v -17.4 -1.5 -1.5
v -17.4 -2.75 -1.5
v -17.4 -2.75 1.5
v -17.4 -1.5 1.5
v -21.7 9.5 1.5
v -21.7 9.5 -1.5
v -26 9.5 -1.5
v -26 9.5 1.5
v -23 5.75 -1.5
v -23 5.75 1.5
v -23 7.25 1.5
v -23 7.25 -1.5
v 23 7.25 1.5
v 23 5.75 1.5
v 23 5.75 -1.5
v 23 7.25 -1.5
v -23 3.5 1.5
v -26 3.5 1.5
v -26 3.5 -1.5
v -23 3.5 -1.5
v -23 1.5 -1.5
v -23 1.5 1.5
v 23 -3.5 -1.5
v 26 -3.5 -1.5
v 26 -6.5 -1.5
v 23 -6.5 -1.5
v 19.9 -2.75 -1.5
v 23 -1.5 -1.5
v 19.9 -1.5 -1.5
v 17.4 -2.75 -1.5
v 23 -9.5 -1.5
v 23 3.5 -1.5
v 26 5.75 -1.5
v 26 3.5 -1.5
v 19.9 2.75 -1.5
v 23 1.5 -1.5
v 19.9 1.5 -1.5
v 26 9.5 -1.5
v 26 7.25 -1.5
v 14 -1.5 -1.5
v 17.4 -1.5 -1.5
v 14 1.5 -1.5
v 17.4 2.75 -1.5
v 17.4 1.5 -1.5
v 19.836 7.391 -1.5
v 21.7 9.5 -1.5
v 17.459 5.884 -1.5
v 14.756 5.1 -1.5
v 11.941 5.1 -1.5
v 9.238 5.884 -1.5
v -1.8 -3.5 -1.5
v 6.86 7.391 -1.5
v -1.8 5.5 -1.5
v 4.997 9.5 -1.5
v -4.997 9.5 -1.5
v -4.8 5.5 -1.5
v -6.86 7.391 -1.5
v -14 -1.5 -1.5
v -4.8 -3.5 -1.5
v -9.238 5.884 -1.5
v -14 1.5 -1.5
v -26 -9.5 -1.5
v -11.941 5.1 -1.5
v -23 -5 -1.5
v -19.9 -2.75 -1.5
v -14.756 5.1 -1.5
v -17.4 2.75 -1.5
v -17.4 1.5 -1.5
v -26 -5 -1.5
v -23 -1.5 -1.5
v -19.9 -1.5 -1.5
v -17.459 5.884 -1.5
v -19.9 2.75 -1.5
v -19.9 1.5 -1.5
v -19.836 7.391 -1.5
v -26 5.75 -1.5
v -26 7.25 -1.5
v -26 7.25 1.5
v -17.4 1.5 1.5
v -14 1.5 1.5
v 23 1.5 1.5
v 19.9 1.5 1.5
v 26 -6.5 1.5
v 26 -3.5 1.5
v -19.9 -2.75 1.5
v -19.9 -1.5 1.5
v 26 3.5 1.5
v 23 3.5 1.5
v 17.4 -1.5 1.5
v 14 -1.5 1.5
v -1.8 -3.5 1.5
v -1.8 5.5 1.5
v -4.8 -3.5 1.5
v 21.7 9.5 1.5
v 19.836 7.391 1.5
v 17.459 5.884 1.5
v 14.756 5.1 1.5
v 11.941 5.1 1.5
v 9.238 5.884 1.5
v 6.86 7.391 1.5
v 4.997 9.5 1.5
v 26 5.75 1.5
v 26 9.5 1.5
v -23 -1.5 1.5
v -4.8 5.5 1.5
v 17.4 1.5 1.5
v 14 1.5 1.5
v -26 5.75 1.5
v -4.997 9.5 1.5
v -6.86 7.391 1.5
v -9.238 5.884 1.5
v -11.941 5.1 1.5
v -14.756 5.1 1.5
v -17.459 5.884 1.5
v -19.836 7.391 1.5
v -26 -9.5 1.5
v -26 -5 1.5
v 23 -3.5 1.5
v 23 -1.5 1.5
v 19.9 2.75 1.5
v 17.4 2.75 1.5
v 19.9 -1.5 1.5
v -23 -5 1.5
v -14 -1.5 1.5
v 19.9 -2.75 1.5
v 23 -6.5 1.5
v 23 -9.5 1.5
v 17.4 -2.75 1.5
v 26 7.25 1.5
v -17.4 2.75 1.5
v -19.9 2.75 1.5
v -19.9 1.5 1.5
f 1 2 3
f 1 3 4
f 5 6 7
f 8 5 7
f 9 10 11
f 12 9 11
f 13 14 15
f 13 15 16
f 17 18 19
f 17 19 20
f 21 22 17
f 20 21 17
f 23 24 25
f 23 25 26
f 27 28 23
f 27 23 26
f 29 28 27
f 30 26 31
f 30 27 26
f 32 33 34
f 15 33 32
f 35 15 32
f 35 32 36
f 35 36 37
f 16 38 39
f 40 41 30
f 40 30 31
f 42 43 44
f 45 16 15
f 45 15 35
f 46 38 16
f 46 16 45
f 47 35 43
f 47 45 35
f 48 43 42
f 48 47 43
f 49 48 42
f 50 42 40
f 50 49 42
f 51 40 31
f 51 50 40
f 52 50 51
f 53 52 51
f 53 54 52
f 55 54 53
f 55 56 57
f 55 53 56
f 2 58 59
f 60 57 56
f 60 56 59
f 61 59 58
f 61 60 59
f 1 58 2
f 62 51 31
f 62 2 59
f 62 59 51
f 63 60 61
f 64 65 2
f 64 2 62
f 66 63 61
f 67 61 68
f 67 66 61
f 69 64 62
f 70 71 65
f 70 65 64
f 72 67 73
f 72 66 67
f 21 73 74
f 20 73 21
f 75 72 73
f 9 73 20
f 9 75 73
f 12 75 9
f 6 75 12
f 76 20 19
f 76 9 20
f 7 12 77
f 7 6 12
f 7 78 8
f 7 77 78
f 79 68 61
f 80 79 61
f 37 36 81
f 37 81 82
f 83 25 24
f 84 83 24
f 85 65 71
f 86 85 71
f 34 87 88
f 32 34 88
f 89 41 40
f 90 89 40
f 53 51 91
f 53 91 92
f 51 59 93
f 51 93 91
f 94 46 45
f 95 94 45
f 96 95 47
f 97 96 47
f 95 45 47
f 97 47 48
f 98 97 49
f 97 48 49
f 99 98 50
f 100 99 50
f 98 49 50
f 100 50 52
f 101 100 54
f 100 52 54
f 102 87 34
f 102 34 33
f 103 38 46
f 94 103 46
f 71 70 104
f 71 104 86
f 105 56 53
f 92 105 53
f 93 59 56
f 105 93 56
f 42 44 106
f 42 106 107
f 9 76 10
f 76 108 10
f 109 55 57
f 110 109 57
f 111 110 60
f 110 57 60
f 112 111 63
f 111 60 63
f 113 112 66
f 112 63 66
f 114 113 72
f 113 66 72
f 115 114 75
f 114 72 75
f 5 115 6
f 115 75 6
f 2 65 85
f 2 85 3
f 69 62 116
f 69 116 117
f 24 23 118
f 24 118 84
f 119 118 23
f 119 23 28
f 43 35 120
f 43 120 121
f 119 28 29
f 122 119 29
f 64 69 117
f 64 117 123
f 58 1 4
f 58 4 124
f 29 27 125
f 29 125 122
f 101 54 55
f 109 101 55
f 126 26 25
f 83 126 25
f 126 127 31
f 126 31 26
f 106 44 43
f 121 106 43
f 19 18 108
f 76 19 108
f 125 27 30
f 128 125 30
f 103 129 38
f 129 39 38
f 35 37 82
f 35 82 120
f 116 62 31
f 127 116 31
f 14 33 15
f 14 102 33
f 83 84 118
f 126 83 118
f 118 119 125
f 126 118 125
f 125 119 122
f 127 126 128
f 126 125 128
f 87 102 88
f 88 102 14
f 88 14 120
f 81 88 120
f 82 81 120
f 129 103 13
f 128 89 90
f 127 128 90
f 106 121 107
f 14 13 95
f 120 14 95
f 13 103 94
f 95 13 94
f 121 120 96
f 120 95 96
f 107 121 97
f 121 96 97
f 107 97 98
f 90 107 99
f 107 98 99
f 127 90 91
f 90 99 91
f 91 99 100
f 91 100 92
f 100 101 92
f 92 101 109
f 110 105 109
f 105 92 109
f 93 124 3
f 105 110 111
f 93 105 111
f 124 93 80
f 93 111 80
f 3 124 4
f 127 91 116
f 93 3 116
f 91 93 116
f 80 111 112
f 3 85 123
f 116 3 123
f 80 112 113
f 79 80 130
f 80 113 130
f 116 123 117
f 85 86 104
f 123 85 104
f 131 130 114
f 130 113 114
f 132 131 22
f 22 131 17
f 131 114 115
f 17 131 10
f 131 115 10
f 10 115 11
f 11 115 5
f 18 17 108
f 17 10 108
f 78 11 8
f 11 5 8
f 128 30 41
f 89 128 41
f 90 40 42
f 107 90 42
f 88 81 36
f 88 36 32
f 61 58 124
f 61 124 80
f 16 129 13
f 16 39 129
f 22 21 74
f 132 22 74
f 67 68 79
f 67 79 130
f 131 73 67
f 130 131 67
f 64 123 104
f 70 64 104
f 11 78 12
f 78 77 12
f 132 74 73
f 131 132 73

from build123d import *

# Parameters (mm, degrees)
ESBO_O1_W                     = 46
ESBO_O1_H                     = 19
RESSALTO_EXTRUS_O1_DEPTH      = 1.5
ESBO_O21_W                    = 9
ESBO_O21_H                    = 3
ESBO_O21_W_2                  = 2.5
ESBO_O21_H_2                  = 5.5
CORTE_EXTRUS_O11_DEPTH        = 3
RESSALTO_EXTRUS_O2_DEPTH      = 1.5
RESSALTO_EXTRUS_O2_DEPTH_BACK = 1.5
ESBO_O3_W                     = 3
ESBO_O3_H                     = 4.5
ESBO_O5_W                     = 3
ESBO_O5_H                     = 2.25
RESSALTO_EXTRUS_O3_DEPTH      = 1.5
RESSALTO_EXTRUS_O4_DEPTH      = 1.5
RESSALTO_EXTRUS_O4_DEPTH_BACK = 1.5
ESBO_O6_W                     = 3
ESBO_O6_H                     = 3
CORTE_EXTRUS_O2_DEPTH         = 28.721832551
CORTE_EXTRUS_O2_DEPTH_BACK    = 28.721832551
CORTE_EXTRUS_O3_DEPTH         = 28.721832551
CORTE_EXTRUS_O3_DEPTH_BACK    = 28.721832551
ESBO_O8_W                     = 3
ESBO_O8_H                     = 9


with BuildPart() as part:
    # Esboço1 → Ressalto-extrusão1 (new, symmetric)
    with BuildSketch(Plane.XY):
        Rectangle(ESBO_O1_W, ESBO_O1_H)
    extrude(amount=RESSALTO_EXTRUS_O1_DEPTH, both=True)

    # Esboço21 → Corte-extrusão11 (cut)
    with BuildSketch(Plane(origin=(-7.10842072, -2.477277924, -1.5), x_dir=(-1, 0, 0), z_dir=(0, 0, -1))):
        with Locations((-25.60842072, 2.477277924)):
            Rectangle(ESBO_O21_W, ESBO_O21_H)
        with Locations((-25.75842072, 2.477277924)):
            Rectangle(ESBO_O21_W_2, ESBO_O21_H_2)
    corte_extrus_o11 = extrude(amount=-CORTE_EXTRUS_O11_DEPTH, mode=Mode.SUBTRACT)

    # Espelhar4: Corte-extrusão11 across plane
    add(corte_extrus_o11.mirror(Plane(origin=(0, 0, 0), x_dir=(0, 0, 1), z_dir=(1, 0, 0))), mode=Mode.SUBTRACT)

    # Esboço3 → Ressalto-extrusão2 (add, two sides: drawn at the far end of the back side and taken through both)
    with BuildSketch(Plane.XY.offset(-RESSALTO_EXTRUS_O2_DEPTH_BACK)):
        with Locations((-24.5, -7.25)):
            Rectangle(ESBO_O3_W, ESBO_O3_H)
    extrude(amount=RESSALTO_EXTRUS_O2_DEPTH + RESSALTO_EXTRUS_O2_DEPTH_BACK)

    # Esboço5 → Ressalto-extrusão3 (add, symmetric)
    with BuildSketch(Plane.XY):
        with Locations((-24.5, 8.375)):
            Rectangle(ESBO_O5_W, ESBO_O5_H)
        with Locations((-24.5, 4.625)):
            Rectangle(ESBO_O5_W, ESBO_O5_H)
    ressalto_extrus_o3 = extrude(amount=RESSALTO_EXTRUS_O3_DEPTH, both=True)

    # Espelhar3: Ressalto-extrusão3 across plane
    add(ressalto_extrus_o3.mirror(Plane(origin=(0, 0, 0), x_dir=(0, 0, 1), z_dir=(1, 0, 0))))

    # Esboço6 → Ressalto-extrusão4 (add, two sides: drawn at the far end of the back side and taken through both)
    with BuildSketch(Plane.XY.offset(-RESSALTO_EXTRUS_O4_DEPTH_BACK)):
        with Locations((24.5, -5)):
            Rectangle(ESBO_O6_W, ESBO_O6_H)
    extrude(amount=RESSALTO_EXTRUS_O4_DEPTH + RESSALTO_EXTRUS_O4_DEPTH_BACK)

    # Esboço7 → Corte-extrusão2 (cut, two sides: drawn at the far end of the back side and taken through both)
    with BuildSketch(Plane.XY.offset(-CORTE_EXTRUS_O2_DEPTH_BACK)):
        with BuildLine():
            Line((-21.7, 9.5), (-4.996706912, 9.5))
            ThreePointArc((-4.996706912, 9.5), (-13.348353456, 5), (-21.7, 9.5))
        make_face()
        with BuildLine():
            Line((4.996706912, 9.5), (21.7, 9.5))
            ThreePointArc((21.7, 9.5), (13.348353456, 5), (4.996706912, 9.5))
        make_face()
    extrude(amount=CORTE_EXTRUS_O2_DEPTH + CORTE_EXTRUS_O2_DEPTH_BACK, mode=Mode.SUBTRACT)

    # Esboço8 → Corte-extrusão3 (cut, two sides: drawn at the far end of the back side and taken through both)
    with BuildSketch(Plane.XY.offset(-CORTE_EXTRUS_O3_DEPTH_BACK)):
        with Locations((-3.3, 1)):
            Rectangle(ESBO_O8_W, ESBO_O8_H)
    extrude(amount=CORTE_EXTRUS_O3_DEPTH + CORTE_EXTRUS_O3_DEPTH_BACK, mode=Mode.SUBTRACT)


solid = part.part
